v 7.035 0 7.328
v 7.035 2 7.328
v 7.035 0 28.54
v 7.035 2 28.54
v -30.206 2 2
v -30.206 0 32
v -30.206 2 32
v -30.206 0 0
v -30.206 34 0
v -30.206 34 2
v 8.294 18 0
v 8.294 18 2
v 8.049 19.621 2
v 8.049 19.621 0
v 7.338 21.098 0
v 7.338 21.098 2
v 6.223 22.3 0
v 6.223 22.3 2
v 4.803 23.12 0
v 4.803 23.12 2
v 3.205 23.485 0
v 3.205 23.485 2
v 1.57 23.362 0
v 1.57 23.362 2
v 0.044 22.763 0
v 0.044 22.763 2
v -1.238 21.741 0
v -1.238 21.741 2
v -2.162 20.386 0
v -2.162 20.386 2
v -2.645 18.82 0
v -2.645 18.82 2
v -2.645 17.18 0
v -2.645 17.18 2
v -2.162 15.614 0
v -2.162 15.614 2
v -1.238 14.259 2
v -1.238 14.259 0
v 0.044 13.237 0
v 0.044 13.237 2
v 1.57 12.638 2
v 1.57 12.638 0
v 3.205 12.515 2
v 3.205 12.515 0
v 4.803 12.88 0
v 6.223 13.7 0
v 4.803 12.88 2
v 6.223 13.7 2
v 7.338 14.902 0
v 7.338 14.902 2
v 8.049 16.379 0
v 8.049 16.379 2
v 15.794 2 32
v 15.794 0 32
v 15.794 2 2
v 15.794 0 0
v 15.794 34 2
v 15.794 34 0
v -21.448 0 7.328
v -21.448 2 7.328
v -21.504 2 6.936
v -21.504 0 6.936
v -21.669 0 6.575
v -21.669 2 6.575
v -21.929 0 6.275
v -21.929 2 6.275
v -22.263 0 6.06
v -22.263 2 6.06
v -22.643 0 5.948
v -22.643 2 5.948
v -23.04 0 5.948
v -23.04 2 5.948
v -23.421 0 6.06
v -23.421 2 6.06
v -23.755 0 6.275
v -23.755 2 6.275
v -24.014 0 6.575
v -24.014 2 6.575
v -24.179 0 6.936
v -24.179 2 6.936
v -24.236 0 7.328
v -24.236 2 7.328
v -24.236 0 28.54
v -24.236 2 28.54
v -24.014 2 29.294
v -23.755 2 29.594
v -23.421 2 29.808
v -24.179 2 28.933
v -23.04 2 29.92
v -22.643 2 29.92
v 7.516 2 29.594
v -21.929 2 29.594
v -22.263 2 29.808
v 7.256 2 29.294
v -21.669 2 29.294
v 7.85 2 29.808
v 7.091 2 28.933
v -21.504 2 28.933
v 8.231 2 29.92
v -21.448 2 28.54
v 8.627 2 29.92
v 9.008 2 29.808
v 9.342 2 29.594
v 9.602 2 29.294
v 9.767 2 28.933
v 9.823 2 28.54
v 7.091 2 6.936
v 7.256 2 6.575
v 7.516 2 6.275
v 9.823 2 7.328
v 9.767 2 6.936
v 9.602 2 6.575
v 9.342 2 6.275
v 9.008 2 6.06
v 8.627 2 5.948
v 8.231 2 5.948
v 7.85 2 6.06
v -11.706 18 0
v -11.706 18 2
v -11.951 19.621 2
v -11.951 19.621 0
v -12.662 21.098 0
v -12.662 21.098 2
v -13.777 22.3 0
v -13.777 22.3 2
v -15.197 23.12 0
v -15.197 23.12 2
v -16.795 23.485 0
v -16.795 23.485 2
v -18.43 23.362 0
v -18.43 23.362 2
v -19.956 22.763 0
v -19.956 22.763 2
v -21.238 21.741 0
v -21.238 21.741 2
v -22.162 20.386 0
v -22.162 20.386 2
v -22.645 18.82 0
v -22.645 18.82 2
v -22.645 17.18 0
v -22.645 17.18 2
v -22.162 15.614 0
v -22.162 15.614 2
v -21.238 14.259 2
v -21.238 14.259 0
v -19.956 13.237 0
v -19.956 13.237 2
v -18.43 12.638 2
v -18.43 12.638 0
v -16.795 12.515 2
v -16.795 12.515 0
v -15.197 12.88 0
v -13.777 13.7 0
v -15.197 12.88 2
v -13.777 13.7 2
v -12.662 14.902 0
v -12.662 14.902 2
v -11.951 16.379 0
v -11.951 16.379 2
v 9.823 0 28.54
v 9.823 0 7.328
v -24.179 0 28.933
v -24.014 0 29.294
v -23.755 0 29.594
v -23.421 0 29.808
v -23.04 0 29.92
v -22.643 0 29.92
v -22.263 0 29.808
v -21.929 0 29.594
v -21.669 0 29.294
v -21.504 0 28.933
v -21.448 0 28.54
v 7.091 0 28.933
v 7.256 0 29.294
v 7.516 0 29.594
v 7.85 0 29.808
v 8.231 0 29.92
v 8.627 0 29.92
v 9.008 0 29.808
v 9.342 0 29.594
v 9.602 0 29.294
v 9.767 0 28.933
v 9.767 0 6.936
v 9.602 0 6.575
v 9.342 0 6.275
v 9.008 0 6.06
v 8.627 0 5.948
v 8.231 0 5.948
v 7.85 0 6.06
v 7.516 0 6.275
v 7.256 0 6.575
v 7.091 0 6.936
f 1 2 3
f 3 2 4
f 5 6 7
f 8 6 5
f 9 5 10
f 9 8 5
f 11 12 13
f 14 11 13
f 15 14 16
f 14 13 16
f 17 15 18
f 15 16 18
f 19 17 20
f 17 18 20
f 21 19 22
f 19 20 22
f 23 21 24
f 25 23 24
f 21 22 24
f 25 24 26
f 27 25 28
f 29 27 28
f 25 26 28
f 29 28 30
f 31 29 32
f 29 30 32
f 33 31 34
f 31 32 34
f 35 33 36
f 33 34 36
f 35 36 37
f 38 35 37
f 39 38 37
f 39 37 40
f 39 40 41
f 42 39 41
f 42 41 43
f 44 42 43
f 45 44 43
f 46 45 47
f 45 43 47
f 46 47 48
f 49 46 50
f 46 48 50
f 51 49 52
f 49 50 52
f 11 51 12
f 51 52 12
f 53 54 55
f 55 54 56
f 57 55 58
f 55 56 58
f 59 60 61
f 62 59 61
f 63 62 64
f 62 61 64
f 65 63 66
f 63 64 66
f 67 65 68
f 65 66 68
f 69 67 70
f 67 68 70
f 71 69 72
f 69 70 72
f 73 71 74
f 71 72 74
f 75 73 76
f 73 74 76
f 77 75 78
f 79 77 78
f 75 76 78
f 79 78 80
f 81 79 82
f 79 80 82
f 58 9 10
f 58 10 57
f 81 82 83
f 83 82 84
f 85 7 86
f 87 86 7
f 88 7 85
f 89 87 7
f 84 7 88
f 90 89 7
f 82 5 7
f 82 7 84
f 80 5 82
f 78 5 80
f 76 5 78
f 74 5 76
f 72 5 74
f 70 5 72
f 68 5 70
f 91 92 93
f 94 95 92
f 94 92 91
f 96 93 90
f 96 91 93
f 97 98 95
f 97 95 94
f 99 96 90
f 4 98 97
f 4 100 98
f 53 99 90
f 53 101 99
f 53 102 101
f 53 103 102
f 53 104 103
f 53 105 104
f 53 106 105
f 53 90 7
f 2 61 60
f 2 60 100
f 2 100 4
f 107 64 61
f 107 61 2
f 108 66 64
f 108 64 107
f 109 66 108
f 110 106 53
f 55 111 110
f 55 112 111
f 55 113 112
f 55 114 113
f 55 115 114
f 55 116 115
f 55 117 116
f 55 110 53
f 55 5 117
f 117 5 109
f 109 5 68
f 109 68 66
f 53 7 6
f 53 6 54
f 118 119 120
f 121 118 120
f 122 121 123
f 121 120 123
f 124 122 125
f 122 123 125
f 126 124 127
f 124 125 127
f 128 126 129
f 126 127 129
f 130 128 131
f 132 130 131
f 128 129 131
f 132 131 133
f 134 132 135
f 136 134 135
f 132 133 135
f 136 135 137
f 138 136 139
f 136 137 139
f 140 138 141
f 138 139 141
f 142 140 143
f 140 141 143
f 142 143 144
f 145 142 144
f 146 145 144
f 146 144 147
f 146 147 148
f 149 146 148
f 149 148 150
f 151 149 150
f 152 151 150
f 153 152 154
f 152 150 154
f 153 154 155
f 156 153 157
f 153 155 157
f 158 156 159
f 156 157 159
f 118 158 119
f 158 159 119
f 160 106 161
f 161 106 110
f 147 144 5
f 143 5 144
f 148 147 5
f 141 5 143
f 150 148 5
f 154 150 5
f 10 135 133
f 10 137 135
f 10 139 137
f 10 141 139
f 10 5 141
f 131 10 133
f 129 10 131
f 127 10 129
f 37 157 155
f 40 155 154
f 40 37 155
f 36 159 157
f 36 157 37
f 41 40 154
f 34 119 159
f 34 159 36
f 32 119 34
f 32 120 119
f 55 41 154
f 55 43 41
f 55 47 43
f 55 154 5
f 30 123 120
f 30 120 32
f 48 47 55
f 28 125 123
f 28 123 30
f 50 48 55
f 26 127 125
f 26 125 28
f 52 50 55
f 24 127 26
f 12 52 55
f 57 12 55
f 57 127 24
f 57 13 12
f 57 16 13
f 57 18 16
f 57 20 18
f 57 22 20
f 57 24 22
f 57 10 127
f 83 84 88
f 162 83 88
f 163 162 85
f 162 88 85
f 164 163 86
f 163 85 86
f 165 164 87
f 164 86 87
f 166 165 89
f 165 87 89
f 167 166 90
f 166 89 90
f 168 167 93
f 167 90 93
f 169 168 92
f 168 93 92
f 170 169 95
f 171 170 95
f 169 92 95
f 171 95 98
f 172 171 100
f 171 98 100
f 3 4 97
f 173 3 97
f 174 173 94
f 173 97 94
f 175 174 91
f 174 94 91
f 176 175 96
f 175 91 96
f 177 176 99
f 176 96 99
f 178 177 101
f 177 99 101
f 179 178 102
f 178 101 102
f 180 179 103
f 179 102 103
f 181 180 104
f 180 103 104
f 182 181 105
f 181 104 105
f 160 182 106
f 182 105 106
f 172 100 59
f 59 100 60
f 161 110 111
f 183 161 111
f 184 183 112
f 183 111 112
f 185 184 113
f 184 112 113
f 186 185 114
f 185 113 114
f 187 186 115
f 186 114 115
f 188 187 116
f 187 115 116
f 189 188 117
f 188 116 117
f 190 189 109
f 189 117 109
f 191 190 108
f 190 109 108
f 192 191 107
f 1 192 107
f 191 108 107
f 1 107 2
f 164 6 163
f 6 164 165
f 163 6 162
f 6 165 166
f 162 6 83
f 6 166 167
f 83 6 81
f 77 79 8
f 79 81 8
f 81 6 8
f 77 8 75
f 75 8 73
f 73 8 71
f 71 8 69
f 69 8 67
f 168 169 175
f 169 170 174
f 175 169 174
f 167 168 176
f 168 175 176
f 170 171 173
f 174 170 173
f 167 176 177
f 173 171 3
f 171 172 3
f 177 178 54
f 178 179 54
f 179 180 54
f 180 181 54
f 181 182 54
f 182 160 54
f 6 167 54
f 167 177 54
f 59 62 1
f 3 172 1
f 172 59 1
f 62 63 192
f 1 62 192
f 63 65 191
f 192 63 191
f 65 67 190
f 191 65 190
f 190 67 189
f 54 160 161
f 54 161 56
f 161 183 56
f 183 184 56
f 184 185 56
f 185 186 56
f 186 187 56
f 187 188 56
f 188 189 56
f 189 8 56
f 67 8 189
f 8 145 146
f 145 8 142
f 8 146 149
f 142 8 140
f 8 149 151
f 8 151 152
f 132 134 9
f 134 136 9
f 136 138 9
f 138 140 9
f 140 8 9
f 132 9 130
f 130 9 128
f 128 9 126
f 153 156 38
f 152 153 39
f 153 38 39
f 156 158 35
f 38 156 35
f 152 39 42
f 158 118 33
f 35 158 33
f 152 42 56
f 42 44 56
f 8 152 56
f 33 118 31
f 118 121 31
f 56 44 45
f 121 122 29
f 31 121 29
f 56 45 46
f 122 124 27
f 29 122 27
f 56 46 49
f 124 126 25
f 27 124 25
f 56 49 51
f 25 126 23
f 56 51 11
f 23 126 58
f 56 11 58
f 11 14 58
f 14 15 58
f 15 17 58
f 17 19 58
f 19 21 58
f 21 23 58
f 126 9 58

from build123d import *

# Parameters (mm, degrees)
SKETCH_1_W          = 46
SKETCH_1_H          = 34
EXTRUDE_1_DEPTH     = 2
SKETCH_2_W          = 46
SKETCH_2_H          = 2
EXTRUDE_2_DEPTH     = 30
SKETCH_3_R          = 5.5
CUT_EXTRUDE_1_DEPTH = 2
CUT_EXTRUDE_2_DEPTH = 2


with BuildPart() as part:
    # 草图1 → 凸台-拉伸1 (new body)
    with BuildSketch(Plane.XY):
        with Locations((-7.206275861, 17)):
            Rectangle(SKETCH_1_W, SKETCH_1_H)
    extrude(amount=EXTRUDE_1_DEPTH)

    # 草图2 → 凸台-拉伸2 (add)
    with BuildSketch(Plane.XY.offset(2)):
        with Locations((-7.206275861, 1)):
            Rectangle(SKETCH_2_W, SKETCH_2_H)
    extrude(amount=EXTRUDE_2_DEPTH)

    # 草图3 → 切除-拉伸1 (cut)
    with BuildSketch(Plane.XY.offset(2)):
        with Locations((-17.206275861, 18)):
            Circle(SKETCH_3_R)
        with Locations((2.793724139, 18)):
            Circle(SKETCH_3_R)
    extrude(amount=-CUT_EXTRUDE_1_DEPTH, mode=Mode.SUBTRACT)

    # 草图4 → 切除-拉伸2 (cut)
    with BuildSketch(Plane(origin=(0, 2, 0), x_dir=(1, 0, 0), z_dir=(0, 1, 0))):
        with BuildLine():
            Line((-24.235699599, -7.328343443), (-24.235699599, -28.539953108))
            ThreePointArc((-24.235699599, -28.539953108), (-22.841637624, -29.934015083), (-21.447575649, -28.539953108))
            Line((-21.447575649, -28.539953108), (-21.447575649, -7.328343443))
            ThreePointArc((-21.447575649, -7.328343443), (-22.841637624, -5.934281468), (-24.235699599, -7.328343443))
        make_face()
        with BuildLine():
            Line((7.035023927, -7.328343443), (7.035023927, -28.539953108))
            ThreePointArc((7.035023927, -28.539953108), (8.429085903, -29.934015083), (9.823147878, -28.539953108))
            Line((9.823147878, -28.539953108), (9.823147878, -7.328343443))
            ThreePointArc((9.823147878, -7.328343443), (8.429085903, -5.934281468), (7.035023927, -7.328343443))
        make_face()
    extrude(amount=-CUT_EXTRUDE_2_DEPTH, mode=Mode.SUBTRACT)


solid = part.part
